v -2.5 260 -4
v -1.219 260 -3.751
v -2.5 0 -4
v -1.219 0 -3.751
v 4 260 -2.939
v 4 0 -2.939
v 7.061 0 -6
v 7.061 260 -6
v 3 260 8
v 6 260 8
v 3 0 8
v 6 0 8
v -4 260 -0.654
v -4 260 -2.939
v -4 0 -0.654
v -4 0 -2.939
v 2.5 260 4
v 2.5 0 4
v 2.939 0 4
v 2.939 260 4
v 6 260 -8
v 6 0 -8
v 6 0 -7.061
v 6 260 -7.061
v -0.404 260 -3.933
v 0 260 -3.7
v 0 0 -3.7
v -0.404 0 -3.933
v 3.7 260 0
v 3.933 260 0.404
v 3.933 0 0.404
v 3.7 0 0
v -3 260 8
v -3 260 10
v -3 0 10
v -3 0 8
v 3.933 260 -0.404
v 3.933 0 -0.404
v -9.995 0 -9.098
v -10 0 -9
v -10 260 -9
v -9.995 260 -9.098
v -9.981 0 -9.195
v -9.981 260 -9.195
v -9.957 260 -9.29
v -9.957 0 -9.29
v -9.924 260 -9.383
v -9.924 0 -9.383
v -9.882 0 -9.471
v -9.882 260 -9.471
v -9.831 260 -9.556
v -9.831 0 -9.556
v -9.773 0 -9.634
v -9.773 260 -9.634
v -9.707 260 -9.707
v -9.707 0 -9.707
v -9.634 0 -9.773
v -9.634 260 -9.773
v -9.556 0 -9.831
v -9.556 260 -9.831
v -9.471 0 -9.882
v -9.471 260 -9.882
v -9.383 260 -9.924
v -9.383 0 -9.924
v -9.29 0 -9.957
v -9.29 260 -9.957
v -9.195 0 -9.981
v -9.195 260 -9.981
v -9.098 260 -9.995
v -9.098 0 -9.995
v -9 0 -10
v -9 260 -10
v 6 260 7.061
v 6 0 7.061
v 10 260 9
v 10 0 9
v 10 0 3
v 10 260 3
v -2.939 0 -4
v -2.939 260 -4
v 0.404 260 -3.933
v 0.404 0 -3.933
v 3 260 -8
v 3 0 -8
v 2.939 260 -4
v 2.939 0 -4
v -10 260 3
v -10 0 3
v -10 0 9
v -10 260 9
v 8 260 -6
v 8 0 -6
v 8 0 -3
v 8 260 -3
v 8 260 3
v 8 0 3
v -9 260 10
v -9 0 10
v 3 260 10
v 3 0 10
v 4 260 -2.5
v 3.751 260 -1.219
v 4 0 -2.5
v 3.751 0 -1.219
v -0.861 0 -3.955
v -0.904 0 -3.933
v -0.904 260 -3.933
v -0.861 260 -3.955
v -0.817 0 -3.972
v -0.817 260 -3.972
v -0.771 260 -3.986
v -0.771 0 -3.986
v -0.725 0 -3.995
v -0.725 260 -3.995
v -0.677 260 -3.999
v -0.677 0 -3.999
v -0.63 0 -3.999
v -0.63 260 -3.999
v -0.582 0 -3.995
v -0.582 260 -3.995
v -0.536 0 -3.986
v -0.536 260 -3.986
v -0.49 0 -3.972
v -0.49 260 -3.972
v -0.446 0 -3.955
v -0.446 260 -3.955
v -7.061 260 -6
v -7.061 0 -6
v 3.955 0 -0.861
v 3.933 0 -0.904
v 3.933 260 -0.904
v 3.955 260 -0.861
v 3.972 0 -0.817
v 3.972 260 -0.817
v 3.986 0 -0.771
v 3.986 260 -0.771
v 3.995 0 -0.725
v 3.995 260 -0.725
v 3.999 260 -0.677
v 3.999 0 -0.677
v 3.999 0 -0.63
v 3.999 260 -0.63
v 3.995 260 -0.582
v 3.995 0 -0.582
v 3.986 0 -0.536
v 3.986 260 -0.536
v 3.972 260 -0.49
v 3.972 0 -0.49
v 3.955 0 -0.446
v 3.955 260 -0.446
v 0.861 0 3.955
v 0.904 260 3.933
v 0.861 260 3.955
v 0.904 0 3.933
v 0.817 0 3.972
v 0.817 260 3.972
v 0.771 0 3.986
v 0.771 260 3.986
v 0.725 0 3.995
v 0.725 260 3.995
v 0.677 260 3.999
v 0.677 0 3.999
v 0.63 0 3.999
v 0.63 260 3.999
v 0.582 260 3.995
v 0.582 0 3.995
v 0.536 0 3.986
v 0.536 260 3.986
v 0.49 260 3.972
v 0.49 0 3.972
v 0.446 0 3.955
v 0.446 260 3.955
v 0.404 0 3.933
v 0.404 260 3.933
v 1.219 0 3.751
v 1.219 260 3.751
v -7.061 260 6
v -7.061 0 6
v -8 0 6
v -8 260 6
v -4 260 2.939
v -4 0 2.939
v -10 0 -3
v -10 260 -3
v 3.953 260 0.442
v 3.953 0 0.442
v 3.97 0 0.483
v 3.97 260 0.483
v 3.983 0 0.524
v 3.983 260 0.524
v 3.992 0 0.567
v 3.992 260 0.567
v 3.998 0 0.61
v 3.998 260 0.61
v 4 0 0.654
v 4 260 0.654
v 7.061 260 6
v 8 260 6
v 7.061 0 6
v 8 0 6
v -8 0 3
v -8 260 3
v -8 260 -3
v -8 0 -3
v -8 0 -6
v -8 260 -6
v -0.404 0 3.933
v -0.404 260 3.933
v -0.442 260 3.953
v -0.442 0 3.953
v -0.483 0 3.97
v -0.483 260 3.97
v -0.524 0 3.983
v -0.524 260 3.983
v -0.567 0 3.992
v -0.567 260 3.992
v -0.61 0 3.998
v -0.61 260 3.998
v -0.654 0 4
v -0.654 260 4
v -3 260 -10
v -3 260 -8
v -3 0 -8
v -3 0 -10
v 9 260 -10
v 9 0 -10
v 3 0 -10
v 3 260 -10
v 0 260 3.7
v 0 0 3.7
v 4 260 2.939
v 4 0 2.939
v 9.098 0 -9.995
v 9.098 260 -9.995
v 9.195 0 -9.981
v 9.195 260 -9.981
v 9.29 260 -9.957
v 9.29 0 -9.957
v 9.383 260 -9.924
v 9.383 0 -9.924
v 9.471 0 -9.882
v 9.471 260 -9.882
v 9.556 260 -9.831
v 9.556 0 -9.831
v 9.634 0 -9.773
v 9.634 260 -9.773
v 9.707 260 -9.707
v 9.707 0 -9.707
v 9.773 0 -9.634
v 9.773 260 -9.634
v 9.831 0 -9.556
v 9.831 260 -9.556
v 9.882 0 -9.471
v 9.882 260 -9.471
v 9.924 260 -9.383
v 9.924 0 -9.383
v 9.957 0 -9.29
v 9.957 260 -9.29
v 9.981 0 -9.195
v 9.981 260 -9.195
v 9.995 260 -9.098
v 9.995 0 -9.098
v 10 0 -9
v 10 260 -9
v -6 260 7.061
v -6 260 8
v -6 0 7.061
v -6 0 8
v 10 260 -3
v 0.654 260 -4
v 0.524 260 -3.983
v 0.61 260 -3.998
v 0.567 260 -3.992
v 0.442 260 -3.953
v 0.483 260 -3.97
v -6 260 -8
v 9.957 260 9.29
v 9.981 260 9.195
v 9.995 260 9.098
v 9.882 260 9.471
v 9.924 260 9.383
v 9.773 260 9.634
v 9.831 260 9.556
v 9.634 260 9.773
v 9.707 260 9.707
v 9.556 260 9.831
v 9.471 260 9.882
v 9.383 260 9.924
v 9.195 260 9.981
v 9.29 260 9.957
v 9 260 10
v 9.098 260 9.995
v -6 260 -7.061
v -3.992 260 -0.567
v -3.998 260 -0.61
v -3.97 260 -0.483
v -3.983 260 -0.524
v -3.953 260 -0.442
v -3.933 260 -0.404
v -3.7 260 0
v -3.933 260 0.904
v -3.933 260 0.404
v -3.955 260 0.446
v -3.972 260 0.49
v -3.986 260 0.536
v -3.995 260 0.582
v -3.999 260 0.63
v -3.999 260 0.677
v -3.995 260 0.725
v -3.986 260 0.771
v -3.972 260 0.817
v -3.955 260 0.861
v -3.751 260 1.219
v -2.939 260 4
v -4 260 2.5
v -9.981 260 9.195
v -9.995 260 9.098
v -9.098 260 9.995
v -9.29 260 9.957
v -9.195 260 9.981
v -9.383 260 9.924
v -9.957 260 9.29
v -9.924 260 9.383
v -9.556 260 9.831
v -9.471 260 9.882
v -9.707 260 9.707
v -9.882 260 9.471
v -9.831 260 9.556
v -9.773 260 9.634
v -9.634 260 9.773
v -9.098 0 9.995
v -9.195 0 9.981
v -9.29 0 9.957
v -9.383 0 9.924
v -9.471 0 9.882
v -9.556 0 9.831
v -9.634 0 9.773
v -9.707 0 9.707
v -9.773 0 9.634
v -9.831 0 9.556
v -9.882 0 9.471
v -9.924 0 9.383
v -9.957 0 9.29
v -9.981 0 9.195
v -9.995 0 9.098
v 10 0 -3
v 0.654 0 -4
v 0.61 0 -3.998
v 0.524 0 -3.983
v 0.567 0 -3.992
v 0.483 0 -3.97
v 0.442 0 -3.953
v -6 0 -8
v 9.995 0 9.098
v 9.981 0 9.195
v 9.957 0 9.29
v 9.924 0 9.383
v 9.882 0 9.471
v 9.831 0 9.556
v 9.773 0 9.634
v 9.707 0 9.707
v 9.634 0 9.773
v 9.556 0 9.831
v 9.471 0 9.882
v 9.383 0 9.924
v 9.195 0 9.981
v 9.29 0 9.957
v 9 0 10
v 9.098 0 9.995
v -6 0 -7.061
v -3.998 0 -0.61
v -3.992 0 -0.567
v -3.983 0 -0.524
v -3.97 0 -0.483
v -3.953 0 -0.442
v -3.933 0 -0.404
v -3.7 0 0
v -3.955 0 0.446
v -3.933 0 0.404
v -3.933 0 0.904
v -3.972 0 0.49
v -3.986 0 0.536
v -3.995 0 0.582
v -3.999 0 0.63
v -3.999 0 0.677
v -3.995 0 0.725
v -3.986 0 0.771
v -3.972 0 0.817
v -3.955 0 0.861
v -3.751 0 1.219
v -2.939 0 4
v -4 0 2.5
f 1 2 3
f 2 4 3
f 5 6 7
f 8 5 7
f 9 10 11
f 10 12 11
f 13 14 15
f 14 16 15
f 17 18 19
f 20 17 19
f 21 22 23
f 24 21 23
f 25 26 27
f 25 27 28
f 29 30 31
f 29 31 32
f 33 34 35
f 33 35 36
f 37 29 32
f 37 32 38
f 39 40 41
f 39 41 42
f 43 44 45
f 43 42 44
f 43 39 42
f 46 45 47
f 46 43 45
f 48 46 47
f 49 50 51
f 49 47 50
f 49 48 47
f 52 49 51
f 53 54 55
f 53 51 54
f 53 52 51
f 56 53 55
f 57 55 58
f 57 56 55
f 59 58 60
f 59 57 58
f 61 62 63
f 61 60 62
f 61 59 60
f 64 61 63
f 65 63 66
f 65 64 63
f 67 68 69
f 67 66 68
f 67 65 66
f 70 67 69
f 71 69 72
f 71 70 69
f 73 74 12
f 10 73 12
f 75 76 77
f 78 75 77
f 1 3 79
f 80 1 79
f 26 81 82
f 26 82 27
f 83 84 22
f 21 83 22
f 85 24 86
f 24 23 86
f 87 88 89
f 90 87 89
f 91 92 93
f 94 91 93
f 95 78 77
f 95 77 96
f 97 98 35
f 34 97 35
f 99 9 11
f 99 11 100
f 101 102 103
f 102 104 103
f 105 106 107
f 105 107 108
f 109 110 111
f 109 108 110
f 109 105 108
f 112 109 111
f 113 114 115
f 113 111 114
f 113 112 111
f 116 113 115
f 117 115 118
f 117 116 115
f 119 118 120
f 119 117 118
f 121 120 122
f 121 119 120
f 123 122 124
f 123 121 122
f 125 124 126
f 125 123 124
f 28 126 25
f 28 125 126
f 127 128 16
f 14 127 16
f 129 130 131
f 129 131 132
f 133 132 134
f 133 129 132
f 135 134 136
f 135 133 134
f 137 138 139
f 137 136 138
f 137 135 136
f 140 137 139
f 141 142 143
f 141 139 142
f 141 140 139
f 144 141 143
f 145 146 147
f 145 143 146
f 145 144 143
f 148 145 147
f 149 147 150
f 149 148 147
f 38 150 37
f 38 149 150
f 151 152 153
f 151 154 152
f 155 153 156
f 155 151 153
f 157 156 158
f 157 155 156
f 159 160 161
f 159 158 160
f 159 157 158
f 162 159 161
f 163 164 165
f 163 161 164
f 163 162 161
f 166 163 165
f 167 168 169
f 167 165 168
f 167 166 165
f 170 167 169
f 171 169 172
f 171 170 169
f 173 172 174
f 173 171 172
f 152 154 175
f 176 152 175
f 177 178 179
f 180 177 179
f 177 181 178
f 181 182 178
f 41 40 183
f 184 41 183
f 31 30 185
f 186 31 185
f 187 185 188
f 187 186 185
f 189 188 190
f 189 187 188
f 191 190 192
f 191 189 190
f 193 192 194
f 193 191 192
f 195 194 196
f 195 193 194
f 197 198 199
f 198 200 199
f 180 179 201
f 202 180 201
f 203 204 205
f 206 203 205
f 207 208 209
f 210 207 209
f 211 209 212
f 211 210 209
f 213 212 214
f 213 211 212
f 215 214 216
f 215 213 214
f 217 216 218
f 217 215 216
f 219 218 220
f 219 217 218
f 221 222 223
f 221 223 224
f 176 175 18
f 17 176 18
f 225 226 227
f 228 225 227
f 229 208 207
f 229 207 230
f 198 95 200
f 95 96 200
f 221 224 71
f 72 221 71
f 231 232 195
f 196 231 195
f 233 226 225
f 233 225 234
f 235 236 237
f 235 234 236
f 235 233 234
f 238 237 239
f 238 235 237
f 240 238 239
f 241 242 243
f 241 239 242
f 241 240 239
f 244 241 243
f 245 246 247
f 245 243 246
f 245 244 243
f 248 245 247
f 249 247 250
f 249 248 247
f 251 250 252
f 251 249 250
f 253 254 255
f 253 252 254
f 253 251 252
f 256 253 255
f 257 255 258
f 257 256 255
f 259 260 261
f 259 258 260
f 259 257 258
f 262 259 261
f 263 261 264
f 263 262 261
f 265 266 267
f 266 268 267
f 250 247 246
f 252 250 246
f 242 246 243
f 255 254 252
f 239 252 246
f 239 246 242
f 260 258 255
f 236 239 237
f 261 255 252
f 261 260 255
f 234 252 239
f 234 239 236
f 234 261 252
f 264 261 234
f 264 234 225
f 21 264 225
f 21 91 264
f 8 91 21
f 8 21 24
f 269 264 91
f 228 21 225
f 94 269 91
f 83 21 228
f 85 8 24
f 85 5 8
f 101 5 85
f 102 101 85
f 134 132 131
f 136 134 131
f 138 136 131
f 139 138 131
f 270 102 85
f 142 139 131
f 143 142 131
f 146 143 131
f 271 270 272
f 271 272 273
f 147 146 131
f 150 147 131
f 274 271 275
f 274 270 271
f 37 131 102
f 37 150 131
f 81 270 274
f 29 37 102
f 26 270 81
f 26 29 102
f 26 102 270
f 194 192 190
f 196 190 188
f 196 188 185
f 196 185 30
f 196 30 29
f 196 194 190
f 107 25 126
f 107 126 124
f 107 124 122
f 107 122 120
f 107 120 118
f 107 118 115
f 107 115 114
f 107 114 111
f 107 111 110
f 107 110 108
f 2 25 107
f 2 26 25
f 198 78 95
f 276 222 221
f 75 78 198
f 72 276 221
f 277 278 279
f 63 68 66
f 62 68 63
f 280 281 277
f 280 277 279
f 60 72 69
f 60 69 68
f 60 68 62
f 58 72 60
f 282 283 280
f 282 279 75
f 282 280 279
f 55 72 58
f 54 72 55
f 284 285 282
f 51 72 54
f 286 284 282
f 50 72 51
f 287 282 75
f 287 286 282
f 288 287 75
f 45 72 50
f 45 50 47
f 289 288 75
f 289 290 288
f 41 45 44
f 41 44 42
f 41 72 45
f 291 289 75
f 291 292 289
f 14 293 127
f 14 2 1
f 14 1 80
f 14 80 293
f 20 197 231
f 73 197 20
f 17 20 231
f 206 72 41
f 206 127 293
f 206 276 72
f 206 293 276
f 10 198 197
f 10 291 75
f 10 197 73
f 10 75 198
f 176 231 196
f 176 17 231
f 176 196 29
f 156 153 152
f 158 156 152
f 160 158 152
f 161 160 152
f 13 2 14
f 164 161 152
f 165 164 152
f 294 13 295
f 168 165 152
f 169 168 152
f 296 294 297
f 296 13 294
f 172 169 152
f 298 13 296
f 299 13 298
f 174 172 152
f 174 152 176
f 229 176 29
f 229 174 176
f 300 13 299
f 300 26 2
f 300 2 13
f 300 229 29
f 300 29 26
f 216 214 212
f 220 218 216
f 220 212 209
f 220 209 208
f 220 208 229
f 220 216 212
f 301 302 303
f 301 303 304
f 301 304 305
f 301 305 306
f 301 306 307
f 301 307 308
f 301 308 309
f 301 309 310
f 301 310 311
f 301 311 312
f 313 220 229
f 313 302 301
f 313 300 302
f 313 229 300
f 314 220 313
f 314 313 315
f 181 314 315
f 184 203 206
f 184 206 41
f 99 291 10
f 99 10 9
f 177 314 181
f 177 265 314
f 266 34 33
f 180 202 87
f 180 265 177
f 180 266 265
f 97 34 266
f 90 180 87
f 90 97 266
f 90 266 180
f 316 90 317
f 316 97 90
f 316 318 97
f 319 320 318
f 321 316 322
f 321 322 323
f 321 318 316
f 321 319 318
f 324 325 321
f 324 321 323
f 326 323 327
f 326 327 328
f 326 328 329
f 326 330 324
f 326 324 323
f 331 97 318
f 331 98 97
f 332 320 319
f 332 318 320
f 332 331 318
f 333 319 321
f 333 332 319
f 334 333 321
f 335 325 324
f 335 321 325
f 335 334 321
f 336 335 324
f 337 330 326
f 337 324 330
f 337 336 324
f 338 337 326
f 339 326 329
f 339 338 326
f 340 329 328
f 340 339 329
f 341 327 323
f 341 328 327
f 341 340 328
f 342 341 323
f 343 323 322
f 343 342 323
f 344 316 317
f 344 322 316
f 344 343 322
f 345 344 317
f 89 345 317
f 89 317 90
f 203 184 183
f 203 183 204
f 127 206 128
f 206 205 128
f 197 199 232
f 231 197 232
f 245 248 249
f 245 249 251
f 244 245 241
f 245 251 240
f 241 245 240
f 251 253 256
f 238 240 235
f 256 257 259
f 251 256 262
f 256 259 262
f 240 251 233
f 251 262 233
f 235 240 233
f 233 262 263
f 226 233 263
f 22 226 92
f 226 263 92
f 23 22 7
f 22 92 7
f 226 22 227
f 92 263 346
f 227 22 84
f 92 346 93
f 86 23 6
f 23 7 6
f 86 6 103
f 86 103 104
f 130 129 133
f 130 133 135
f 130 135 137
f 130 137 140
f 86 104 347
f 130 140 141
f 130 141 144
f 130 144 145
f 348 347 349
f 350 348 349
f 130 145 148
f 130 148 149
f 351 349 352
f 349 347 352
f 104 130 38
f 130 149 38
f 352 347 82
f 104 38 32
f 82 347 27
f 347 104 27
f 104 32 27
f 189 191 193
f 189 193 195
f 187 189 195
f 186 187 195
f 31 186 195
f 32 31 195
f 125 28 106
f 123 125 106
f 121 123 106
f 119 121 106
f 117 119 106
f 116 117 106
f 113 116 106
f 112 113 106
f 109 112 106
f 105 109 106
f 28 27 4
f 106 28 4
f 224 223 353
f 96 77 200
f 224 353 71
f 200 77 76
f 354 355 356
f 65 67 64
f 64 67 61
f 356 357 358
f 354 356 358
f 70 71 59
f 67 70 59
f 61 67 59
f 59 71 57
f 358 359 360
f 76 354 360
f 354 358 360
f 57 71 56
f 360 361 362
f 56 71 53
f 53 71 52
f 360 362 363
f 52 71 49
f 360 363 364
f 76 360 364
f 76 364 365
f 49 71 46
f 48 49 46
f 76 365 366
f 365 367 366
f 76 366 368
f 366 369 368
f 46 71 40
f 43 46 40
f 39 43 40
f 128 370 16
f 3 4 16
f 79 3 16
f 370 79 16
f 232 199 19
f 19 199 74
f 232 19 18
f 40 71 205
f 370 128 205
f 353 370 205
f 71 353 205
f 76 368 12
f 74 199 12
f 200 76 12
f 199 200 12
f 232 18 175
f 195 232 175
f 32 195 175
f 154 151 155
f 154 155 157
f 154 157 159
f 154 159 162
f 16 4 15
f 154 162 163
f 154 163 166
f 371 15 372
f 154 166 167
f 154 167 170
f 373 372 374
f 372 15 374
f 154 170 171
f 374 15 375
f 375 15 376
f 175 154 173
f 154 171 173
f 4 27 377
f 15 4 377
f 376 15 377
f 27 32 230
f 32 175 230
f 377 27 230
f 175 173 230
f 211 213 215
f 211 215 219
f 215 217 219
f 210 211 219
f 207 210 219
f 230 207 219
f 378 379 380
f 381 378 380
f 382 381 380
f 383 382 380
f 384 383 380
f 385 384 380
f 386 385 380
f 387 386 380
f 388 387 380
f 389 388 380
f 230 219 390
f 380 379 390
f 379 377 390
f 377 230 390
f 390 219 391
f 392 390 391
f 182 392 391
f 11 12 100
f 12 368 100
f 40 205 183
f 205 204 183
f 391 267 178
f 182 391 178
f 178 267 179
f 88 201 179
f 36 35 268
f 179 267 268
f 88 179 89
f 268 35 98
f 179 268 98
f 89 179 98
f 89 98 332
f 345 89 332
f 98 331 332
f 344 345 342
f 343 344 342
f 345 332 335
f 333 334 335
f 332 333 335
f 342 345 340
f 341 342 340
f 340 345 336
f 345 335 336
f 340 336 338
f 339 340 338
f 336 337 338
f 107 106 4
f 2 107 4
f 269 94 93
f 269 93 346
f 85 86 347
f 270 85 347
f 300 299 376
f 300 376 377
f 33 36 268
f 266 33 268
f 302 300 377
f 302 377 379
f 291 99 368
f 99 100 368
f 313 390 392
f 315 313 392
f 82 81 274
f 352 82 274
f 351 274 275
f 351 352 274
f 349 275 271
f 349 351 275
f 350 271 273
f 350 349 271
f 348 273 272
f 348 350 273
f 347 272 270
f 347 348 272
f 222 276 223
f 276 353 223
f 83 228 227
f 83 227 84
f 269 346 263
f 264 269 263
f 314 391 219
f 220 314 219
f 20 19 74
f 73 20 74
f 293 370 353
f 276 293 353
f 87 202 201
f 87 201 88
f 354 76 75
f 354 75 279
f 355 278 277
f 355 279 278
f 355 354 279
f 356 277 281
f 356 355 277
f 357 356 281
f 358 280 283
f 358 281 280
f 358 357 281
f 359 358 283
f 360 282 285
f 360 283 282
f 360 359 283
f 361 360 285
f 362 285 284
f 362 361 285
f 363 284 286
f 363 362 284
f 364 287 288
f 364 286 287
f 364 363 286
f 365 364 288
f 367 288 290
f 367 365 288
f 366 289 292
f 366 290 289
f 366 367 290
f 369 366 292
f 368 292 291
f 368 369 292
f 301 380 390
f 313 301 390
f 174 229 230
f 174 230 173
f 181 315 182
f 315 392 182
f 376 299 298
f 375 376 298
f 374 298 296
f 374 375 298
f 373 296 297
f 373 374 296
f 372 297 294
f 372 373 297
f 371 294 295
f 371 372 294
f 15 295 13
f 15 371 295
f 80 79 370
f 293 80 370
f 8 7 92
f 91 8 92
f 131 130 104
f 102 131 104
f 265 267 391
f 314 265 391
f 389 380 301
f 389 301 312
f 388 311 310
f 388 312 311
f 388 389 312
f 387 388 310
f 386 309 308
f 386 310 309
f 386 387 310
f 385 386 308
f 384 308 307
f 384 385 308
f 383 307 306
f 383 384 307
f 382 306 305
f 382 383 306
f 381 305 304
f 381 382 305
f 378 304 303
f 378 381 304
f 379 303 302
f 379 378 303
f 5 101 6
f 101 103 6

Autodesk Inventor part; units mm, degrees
ref_plane "YZ Plane" through (0, 0, 0) normal (1, 0, 0) x (0, 1, 0)
ref_plane "XZ Plane" through (0, 0, 0) normal (0, 1, 0) x (-1, 0, 0)
ref_plane "XY Plane" through (0, 0, 0) normal (0, 0, 1) x (1, 0, 0)
sketch "スケッチ1" plane through (0, 0, 0) normal (0, 1, 0) x (-1, 0, 0)
  line L0 (-10, 3) -> (-8, 3)
  line L1 (-8, 3) -> (-8, 6)
  line L2 (-8, 6) -> (-7.0607, 6)
  line L3 (-7.0607, 6) -> (-4, 2.9393)
  line L4 (-4, 2.9393) -> (-4, 0.6536)
  arc A0 (-4, 0.6536) -> (-3.933, 0.4036) centre (-3.5, 0.6536) ccw
  line L5 (-3.933, 0.4036) -> (-3.7, 0)
  line L6 (-3.7, 0) -> (-3.933, -0.4036)
  arc A1 (-3.933, -0.4036) -> (-3.933, -0.9036) centre (-3.5, -0.6536) ccw
  line L7 (-3.933, -0.9036) -> (-3.751, -1.2189)
  line L8 (-3.751, -1.2189) -> (-4, -2.5)
  line L9 (-4, -2.5) -> (-4, -2.9393)
  line L10 (-4, -2.9393) -> (-7.0607, -6)
  line L11 (-7.0607, -6) -> (-8, -6)
  line L12 (-8, -6) -> (-8, -3)
  line L13 (-8, -3) -> (-10, -3)
  line L14 (-10, -3) -> (-10, -9)
  arc A2 (-10, -9) -> (-9, -10) centre (-9, -9) ccw
  line L15 (-9, -10) -> (-3, -10)
  line L16 (-3, -10) -> (-3, -8)
  line L17 (-3, -8) -> (-6, -8)
  line L18 (-6, -8) -> (-6, -7.0607)
  line L19 (-6, -7.0607) -> (-2.9393, -4)
  line L20 (-2.9393, -4) -> (-0.6536, -4)
  arc A3 (-0.6536, -4) -> (-0.4036, -3.933) centre (-0.6536, -3.5) ccw
  line L21 (-0.4036, -3.933) -> (0, -3.7)
  line L22 (0, -3.7) -> (0.4036, -3.933)
  arc A4 (0.4036, -3.933) -> (0.9036, -3.933) centre (0.6536, -3.5) ccw
  line L23 (0.9036, -3.933) -> (1.2189, -3.751)
  line L24 (1.2189, -3.751) -> (2.5, -4)
  line L25 (2.5, -4) -> (2.9393, -4)
  line L26 (2.9393, -4) -> (6, -7.0607)
  line L27 (6, -7.0607) -> (6, -8)
  line L28 (6, -8) -> (3, -8)
  line L29 (3, -8) -> (3, -10)
  line L30 (3, -10) -> (9, -10)
  arc A5 (9, -10) -> (10, -9) centre (9, -9) ccw
  line L31 (10, -9) -> (10, -3)
  line L32 (10, -3) -> (8, -3)
  line L33 (8, -3) -> (8, -6)
  line L34 (8, -6) -> (7.0607, -6)
  line L35 (7.0607, -6) -> (4, -2.9393)
  line L36 (4, -2.9393) -> (4, -0.6536)
  arc A6 (4, -0.6536) -> (3.933, -0.4036) centre (3.5, -0.6536) ccw
  line L37 (3.933, -0.4036) -> (3.7, 0)
  line L38 (3.7, 0) -> (3.933, 0.4036)
  arc A7 (3.933, 0.4036) -> (3.933, 0.9036) centre (3.5, 0.6536) ccw
  line L39 (3.933, 0.9036) -> (3.751, 1.2189)
  line L40 (3.751, 1.2189) -> (4, 2.5)
  line L41 (4, 2.5) -> (4, 2.9393)
  line L42 (4, 2.9393) -> (7.0607, 6)
  line L43 (7.0607, 6) -> (8, 6)
  line L44 (8, 6) -> (8, 3)
  line L45 (8, 3) -> (10, 3)
  line L46 (10, 3) -> (10, 9)
  arc A8 (10, 9) -> (9, 10) centre (9, 9) ccw
  line L47 (9, 10) -> (3, 10)
  line L48 (3, 10) -> (3, 8)
  line L49 (3, 8) -> (6, 8)
  line L50 (6, 8) -> (6, 7.0607)
  line L51 (6, 7.0607) -> (2.9393, 4)
  line L52 (2.9393, 4) -> (0.6536, 4)
  arc A9 (0.6536, 4) -> (0.4036, 3.933) centre (0.6536, 3.5) ccw
  line L53 (0.4036, 3.933) -> (0, 3.7)
  line L54 (0, 3.7) -> (-0.4036, 3.933)
  arc A10 (-0.4036, 3.933) -> (-0.9036, 3.933) centre (-0.6536, 3.5) ccw
  line L55 (-0.9036, 3.933) -> (-1.2189, 3.751)
  line L56 (-1.2189, 3.751) -> (-2.5, 4)
  line L57 (-2.5, 4) -> (-2.9393, 4)
  line L58 (-2.9393, 4) -> (-6, 7.0607)
  line L59 (-6, 7.0607) -> (-6, 8)
  line L60 (-6, 8) -> (-3, 8)
  line L61 (-3, 8) -> (-3, 10)
  line L62 (-3, 10) -> (-9, 10)
  arc A11 (-9, 10) -> (-10, 9) centre (-9, 9) ccw
  line L63 (-10, 9) -> (-10, 3)
  point P0 (0, 0)
extrude "押し出し1" add sketch "スケッチ1" along normal blind 260
properties part number "NFS5-2020-260"
